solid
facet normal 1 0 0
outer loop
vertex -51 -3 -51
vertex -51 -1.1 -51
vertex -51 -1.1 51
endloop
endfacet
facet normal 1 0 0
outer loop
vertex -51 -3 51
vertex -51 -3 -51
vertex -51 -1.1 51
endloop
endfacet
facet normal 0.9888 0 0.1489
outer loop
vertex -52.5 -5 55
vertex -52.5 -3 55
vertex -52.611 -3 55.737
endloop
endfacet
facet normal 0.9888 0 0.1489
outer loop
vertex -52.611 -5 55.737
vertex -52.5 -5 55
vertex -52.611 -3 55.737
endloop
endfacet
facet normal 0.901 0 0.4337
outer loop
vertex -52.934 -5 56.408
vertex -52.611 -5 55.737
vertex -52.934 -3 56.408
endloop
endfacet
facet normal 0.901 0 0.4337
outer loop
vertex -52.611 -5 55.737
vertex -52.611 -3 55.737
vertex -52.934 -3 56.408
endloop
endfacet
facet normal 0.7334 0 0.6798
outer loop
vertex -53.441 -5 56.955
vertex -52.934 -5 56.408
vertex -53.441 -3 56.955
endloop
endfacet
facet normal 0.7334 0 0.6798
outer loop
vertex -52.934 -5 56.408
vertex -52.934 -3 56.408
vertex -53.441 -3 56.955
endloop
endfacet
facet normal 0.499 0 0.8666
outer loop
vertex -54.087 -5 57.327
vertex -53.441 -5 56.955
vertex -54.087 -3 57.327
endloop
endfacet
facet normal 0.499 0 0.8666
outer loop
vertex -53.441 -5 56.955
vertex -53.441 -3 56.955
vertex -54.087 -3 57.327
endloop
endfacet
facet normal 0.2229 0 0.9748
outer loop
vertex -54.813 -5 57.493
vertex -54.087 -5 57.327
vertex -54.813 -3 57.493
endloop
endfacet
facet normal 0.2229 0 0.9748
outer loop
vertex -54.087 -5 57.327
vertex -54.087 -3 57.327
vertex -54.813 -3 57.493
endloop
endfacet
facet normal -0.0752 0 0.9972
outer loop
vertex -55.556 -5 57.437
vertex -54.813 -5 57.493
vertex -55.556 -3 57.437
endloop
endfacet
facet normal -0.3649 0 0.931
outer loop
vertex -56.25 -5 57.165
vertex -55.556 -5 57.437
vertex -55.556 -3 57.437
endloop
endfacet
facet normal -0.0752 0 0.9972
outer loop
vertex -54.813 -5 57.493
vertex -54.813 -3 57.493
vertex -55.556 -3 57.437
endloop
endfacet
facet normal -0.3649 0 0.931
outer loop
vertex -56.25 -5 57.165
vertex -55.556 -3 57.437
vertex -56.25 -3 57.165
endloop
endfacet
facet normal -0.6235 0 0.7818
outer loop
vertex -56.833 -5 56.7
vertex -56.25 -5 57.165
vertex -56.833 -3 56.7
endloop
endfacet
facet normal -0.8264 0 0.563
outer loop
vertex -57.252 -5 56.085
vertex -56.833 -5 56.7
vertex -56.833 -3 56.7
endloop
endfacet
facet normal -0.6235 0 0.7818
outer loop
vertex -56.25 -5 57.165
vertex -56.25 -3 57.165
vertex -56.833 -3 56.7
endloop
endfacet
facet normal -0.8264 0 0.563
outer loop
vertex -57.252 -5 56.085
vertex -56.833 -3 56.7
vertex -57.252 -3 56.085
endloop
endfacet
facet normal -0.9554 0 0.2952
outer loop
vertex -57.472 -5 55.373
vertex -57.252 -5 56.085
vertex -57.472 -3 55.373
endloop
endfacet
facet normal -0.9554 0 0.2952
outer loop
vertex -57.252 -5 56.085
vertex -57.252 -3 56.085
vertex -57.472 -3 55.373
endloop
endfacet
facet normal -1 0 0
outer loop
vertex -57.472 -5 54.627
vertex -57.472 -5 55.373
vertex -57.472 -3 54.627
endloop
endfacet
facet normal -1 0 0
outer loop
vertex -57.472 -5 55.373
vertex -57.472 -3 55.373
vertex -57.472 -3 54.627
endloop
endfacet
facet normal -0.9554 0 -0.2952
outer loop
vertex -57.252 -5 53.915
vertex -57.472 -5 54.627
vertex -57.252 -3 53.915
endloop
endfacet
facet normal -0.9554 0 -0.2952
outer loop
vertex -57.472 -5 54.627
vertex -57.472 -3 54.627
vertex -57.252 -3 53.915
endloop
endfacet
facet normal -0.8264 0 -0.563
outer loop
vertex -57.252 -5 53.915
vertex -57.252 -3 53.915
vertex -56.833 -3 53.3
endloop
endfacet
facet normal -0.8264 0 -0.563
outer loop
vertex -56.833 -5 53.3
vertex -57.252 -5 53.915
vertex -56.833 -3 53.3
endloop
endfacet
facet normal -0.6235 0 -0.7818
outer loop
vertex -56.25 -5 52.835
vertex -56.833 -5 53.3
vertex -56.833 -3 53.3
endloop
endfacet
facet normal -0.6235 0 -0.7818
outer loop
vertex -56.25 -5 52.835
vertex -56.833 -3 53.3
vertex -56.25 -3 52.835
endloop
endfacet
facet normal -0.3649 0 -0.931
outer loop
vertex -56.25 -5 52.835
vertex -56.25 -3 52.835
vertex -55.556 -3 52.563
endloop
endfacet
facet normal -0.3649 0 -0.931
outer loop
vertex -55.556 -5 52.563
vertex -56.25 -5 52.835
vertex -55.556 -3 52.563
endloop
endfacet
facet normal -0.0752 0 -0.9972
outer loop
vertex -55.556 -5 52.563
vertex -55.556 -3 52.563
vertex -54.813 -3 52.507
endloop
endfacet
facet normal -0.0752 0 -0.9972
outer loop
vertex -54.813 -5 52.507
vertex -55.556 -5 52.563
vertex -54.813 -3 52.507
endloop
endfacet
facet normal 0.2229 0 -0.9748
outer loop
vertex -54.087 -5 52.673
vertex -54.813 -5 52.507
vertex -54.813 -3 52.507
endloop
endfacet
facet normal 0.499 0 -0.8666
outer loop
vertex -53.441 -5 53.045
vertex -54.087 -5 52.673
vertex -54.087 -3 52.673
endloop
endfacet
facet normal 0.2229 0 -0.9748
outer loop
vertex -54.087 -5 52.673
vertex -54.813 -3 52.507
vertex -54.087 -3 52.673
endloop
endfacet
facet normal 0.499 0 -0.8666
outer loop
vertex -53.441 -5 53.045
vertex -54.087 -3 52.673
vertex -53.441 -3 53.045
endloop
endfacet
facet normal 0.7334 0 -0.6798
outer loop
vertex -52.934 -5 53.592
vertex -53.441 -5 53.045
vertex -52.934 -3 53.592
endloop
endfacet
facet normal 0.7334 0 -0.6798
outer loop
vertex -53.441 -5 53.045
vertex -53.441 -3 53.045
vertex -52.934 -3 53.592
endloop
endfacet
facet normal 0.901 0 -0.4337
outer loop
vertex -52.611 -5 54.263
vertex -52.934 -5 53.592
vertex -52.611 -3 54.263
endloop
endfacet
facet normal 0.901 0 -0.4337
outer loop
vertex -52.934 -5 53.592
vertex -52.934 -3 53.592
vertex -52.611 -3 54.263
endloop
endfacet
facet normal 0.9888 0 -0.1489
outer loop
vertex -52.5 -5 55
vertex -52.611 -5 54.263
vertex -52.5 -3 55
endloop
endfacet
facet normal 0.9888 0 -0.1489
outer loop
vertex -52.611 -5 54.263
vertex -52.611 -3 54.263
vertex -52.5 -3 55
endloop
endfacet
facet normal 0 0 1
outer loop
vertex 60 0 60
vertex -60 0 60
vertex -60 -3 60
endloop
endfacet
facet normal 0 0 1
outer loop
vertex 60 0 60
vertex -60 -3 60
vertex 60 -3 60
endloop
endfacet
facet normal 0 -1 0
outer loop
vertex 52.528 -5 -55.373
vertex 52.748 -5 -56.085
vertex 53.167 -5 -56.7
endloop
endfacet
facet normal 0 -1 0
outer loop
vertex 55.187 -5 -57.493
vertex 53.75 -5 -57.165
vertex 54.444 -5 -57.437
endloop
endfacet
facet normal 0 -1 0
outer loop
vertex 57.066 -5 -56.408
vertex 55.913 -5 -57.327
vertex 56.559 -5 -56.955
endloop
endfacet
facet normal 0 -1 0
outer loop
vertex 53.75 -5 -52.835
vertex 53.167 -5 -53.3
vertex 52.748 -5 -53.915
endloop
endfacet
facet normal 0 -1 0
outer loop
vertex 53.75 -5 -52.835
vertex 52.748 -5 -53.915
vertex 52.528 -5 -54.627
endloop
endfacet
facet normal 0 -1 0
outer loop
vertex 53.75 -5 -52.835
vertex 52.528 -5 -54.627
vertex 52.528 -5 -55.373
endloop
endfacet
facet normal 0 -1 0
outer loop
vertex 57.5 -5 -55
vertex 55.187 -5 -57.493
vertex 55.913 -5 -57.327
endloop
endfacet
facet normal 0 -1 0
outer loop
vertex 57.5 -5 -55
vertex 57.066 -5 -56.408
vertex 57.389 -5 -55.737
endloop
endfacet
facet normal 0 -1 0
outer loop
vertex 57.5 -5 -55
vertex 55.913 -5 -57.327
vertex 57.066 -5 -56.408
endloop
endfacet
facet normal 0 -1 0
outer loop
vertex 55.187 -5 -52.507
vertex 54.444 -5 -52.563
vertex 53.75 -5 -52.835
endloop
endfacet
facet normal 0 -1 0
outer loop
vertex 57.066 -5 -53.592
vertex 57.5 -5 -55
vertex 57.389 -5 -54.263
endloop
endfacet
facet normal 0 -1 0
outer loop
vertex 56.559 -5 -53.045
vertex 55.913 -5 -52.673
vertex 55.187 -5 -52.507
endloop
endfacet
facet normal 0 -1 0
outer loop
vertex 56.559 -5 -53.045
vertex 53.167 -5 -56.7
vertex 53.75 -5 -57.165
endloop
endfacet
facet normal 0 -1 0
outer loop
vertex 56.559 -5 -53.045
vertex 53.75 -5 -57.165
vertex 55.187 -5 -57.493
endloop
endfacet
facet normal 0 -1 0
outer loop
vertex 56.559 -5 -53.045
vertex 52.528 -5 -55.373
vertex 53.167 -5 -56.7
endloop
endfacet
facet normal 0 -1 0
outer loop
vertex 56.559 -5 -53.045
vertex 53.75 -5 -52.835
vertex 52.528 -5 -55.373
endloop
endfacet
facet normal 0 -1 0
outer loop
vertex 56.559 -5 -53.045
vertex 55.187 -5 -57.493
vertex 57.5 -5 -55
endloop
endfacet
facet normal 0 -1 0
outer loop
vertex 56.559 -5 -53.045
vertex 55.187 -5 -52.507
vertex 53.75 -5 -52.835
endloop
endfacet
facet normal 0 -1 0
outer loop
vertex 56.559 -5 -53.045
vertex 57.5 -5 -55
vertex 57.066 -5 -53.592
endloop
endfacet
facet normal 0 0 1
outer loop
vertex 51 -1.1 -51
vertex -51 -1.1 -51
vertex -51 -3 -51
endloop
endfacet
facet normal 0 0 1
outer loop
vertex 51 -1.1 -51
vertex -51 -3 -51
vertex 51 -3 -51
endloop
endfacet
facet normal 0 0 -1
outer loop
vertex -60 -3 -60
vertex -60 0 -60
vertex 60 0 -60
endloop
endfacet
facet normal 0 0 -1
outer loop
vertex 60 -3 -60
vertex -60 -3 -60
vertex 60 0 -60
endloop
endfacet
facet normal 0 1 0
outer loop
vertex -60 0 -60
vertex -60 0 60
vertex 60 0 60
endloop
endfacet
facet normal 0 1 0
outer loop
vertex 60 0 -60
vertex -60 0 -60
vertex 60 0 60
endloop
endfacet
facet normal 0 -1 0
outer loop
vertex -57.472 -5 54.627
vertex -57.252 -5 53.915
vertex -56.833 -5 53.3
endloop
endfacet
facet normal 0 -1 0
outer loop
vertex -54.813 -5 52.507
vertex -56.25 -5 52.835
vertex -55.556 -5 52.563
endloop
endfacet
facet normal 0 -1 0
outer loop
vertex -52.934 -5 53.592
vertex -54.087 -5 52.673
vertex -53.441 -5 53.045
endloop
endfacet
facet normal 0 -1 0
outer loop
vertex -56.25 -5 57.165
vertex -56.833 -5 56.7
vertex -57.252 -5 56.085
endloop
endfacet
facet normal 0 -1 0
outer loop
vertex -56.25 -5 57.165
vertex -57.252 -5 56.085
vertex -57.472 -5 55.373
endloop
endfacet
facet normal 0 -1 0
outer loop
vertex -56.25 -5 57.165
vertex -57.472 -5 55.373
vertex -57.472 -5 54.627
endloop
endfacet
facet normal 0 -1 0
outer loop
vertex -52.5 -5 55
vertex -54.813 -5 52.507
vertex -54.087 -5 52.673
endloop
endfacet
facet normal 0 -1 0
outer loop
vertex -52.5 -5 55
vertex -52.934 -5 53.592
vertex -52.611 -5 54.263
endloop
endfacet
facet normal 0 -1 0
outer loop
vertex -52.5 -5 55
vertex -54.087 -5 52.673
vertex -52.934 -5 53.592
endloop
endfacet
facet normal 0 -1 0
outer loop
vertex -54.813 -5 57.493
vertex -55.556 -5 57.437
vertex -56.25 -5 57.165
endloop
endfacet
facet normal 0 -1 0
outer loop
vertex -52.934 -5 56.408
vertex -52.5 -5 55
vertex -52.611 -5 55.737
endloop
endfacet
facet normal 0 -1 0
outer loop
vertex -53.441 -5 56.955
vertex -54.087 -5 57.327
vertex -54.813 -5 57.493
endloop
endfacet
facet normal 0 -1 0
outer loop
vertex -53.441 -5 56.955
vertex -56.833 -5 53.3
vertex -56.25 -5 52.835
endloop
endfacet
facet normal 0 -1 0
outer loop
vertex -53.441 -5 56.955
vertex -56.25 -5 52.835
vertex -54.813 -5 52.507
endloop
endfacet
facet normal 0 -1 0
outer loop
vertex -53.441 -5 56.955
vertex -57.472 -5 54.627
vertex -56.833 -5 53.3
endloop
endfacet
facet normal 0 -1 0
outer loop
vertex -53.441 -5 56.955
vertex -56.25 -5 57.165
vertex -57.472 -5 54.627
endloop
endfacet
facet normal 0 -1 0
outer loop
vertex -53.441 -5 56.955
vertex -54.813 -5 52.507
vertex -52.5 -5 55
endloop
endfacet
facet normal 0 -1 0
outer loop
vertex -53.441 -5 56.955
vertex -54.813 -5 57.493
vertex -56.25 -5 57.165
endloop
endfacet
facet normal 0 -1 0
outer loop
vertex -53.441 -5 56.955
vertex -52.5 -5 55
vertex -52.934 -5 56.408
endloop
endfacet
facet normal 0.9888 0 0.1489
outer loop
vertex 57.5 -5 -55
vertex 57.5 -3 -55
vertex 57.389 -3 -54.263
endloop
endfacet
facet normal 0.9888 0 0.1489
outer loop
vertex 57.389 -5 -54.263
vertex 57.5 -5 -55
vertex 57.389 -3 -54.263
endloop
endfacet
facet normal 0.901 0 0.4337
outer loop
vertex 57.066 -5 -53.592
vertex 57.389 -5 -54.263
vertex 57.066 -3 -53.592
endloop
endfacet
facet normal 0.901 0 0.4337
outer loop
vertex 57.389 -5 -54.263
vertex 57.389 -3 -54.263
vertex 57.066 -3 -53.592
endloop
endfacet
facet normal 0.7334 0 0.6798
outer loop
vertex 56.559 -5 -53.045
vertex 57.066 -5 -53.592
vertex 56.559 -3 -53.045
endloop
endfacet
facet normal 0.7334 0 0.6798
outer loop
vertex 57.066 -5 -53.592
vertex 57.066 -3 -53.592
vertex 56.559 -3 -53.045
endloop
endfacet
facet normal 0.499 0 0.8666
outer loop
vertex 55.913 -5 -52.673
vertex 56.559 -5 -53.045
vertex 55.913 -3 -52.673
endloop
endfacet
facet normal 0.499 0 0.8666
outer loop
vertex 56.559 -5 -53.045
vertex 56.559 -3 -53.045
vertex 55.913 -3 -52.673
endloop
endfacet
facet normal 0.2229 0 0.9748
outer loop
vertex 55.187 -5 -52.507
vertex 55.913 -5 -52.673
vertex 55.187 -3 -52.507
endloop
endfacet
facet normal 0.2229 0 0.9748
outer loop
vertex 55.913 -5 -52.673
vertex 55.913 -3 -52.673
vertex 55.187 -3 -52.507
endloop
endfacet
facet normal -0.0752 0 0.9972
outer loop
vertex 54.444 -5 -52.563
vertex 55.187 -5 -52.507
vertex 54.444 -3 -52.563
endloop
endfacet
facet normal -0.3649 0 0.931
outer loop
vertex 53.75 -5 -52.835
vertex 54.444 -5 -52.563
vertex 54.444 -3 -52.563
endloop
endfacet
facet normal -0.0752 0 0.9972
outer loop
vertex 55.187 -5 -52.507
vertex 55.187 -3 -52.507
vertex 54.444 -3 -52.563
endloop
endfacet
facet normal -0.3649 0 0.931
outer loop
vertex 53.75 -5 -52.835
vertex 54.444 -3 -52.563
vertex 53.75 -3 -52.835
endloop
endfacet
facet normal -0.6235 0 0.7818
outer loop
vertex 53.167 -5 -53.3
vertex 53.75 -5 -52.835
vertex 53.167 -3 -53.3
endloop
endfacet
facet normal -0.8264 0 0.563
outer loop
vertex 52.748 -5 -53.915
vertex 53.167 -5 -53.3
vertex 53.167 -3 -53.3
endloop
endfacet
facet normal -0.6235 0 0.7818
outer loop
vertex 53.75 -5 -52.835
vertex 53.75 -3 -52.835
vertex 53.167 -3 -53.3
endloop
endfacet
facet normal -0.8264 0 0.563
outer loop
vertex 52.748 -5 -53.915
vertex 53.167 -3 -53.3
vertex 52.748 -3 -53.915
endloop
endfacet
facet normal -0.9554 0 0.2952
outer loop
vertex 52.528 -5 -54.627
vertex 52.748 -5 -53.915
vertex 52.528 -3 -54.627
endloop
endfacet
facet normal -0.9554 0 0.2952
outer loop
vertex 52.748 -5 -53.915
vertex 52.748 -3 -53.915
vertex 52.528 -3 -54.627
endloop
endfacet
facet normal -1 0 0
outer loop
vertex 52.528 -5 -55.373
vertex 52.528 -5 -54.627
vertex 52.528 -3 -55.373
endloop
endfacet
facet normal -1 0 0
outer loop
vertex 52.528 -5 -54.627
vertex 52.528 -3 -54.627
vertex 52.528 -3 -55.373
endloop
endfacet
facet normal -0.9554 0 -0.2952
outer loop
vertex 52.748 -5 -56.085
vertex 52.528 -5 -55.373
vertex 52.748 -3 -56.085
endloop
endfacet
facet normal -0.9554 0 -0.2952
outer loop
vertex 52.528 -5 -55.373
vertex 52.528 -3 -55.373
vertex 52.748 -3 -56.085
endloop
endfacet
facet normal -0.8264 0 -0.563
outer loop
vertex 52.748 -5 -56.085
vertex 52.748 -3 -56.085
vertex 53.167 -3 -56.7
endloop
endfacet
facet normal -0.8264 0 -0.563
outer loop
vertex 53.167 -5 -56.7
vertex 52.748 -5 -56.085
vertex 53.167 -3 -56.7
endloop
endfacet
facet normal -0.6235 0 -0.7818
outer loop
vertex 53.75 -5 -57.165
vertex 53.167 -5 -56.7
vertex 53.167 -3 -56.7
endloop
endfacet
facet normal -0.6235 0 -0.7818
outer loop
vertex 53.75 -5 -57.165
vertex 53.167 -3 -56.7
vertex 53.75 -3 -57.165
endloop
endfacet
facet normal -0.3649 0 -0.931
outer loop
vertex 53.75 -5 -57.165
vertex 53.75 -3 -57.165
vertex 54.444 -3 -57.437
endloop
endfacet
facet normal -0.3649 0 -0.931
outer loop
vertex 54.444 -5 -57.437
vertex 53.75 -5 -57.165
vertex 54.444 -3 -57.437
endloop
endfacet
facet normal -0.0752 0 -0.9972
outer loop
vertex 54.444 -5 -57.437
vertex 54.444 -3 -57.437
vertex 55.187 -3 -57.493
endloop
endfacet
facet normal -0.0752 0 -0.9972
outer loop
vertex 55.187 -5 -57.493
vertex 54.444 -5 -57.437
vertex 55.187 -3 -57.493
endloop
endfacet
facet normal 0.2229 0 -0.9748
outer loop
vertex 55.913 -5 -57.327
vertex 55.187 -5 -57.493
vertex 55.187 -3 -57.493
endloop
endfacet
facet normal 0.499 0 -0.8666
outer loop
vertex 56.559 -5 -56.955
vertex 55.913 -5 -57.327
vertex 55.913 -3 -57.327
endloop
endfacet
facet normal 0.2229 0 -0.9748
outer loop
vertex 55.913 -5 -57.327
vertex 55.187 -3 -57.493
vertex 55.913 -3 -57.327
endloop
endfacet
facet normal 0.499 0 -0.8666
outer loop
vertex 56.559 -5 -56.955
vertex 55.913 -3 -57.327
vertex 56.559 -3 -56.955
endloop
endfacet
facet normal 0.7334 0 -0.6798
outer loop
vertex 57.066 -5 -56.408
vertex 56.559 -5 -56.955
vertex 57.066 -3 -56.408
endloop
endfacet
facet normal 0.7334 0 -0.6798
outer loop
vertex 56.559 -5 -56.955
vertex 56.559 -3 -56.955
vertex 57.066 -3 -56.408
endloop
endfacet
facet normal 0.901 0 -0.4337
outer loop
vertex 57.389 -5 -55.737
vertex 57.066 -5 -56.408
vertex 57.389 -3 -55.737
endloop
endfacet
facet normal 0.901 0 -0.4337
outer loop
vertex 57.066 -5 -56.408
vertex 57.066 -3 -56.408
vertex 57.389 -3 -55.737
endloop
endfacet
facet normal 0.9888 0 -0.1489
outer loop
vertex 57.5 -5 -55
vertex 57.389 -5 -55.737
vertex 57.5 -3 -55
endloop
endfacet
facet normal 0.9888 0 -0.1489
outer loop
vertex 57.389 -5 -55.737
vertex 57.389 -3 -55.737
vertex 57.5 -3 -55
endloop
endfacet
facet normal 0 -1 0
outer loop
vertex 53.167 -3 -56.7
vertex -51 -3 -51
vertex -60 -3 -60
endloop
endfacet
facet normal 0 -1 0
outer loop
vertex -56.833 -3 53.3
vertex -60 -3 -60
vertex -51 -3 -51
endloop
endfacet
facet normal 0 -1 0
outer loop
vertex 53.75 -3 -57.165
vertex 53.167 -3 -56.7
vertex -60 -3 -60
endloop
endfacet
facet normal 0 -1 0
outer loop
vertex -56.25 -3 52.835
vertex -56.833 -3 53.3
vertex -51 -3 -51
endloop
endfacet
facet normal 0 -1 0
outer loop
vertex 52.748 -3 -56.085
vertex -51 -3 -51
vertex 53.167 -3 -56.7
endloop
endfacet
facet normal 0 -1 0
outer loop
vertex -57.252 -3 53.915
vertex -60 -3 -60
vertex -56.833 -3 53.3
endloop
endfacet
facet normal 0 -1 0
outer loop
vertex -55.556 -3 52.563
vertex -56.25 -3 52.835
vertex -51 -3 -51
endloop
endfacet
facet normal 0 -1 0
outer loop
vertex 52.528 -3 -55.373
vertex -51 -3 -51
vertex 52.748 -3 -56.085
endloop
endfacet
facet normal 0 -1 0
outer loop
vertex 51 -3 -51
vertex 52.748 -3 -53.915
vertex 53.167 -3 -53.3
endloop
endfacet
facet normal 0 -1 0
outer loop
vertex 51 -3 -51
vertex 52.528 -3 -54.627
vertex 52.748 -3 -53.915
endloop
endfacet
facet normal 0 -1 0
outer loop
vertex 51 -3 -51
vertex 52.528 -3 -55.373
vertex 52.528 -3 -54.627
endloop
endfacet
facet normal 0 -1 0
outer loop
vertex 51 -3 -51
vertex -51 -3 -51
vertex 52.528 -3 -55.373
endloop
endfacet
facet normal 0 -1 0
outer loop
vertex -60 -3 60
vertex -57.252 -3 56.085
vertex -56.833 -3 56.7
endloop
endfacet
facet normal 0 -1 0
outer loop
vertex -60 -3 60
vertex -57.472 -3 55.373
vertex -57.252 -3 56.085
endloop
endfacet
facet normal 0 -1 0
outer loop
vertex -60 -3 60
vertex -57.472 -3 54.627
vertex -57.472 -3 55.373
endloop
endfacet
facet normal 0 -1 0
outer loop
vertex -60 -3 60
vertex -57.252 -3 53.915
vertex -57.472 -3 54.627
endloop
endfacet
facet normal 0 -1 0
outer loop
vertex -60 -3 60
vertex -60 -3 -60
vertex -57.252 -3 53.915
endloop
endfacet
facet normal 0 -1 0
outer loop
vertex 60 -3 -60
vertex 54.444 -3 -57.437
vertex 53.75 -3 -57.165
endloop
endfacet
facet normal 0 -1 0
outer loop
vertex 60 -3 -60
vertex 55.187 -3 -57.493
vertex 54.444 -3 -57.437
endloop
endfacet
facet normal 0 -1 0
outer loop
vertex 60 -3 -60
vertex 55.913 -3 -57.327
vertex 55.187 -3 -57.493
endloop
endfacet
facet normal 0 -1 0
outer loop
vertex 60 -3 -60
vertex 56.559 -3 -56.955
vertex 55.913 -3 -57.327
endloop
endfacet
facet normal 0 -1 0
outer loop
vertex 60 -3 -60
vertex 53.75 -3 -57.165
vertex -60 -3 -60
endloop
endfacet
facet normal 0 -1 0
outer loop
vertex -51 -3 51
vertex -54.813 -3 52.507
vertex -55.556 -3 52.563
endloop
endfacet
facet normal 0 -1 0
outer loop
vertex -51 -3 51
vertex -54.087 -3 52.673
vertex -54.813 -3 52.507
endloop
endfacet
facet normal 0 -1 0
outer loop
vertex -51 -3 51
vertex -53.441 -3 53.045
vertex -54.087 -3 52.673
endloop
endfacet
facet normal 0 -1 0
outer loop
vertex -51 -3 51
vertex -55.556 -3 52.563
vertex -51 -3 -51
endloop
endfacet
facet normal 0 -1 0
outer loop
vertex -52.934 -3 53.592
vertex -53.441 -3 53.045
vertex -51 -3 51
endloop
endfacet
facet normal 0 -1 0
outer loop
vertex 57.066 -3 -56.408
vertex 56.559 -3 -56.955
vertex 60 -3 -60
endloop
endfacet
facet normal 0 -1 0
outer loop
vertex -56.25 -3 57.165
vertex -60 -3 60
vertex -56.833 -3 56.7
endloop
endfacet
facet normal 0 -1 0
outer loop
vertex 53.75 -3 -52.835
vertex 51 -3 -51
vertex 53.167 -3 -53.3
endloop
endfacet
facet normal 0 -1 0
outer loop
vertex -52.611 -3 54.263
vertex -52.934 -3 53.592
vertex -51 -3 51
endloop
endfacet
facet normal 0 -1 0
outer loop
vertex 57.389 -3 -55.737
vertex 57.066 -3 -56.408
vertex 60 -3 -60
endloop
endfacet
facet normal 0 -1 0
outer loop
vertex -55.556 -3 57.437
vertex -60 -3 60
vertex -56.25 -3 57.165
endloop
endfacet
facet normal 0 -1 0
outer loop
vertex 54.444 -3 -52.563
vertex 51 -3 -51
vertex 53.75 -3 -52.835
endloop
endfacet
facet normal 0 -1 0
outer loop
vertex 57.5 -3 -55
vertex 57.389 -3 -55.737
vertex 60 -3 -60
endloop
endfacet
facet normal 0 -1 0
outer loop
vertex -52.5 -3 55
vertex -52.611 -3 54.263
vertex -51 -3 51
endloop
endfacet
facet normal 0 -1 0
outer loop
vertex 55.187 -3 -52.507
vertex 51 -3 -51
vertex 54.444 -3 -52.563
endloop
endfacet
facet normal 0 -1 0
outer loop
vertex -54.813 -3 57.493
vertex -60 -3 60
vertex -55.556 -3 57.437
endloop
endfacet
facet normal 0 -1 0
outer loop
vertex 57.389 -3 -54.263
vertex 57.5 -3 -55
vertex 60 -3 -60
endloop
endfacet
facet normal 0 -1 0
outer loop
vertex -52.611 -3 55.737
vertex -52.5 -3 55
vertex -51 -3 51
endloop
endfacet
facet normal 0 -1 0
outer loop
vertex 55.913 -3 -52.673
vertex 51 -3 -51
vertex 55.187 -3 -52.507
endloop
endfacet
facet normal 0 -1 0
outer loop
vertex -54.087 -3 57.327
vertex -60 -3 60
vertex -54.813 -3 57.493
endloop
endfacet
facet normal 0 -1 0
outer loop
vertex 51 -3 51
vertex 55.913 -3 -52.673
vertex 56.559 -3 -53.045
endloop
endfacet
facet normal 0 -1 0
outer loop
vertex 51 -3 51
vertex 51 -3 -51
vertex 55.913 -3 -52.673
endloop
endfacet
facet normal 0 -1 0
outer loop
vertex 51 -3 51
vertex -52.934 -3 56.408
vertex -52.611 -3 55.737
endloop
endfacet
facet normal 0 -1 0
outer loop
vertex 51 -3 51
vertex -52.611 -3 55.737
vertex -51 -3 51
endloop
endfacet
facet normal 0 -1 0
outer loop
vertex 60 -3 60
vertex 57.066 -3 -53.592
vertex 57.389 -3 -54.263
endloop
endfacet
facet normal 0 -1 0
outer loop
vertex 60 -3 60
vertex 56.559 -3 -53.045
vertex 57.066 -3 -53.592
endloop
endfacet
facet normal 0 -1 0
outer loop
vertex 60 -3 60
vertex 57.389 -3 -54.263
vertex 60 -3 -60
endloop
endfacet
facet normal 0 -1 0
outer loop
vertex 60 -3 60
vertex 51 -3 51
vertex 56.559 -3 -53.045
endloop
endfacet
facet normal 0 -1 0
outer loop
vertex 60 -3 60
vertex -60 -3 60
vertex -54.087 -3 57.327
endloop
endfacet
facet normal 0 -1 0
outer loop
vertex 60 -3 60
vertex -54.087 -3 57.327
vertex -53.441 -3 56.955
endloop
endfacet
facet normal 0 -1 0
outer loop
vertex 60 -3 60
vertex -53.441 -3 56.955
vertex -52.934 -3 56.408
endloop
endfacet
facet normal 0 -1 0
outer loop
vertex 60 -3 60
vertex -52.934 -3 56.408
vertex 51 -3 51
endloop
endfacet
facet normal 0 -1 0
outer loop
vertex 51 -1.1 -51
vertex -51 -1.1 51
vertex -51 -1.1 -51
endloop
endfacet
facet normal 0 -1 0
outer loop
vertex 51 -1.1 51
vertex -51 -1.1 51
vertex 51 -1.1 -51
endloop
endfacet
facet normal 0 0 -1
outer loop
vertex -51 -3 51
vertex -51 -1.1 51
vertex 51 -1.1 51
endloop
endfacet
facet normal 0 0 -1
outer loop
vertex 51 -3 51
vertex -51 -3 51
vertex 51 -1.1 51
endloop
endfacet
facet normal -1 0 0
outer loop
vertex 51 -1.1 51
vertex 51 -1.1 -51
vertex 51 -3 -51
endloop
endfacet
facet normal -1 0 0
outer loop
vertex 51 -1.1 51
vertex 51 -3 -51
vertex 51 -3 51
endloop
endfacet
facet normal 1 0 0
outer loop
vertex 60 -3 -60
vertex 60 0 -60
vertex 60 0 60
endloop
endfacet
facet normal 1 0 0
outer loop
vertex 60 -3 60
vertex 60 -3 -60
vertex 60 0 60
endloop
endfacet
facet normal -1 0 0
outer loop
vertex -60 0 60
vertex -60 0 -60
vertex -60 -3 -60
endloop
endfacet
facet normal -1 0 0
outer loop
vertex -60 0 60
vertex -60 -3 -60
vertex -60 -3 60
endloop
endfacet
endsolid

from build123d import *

# Parameters (mm, degrees)
F0_W     = 120
F0_H     = 120
F0_W_2   = 102
F0_H_2   = 102
F1_DEPTH = 3
F2_DEPTH = 1.1
F3_R     = 2.5
F4_DEPTH = 2


with BuildPart() as f1:
    # F0 (on Front) → F1 (new body)
    with BuildSketch(Plane.XZ):
        Rectangle(F0_W, F0_H)
        Rectangle(F0_W_2, F0_H_2, mode=Mode.SUBTRACT)
    extrude(amount=F1_DEPTH)

    # F0 (on Front) → F2 (join)
    with BuildSketch(Plane.XZ):
        Rectangle(F0_W_2, F0_H_2)
    extrude(amount=F2_DEPTH)

    # F3 (on face) → F4 (join)
    with BuildSketch(Plane.XZ.offset(3)):
        with Locations((-55, 55)):
            Circle(F3_R)
        with Locations((55, -55)):
            Circle(F3_R)
    extrude(amount=F4_DEPTH)


solid = f1.part
